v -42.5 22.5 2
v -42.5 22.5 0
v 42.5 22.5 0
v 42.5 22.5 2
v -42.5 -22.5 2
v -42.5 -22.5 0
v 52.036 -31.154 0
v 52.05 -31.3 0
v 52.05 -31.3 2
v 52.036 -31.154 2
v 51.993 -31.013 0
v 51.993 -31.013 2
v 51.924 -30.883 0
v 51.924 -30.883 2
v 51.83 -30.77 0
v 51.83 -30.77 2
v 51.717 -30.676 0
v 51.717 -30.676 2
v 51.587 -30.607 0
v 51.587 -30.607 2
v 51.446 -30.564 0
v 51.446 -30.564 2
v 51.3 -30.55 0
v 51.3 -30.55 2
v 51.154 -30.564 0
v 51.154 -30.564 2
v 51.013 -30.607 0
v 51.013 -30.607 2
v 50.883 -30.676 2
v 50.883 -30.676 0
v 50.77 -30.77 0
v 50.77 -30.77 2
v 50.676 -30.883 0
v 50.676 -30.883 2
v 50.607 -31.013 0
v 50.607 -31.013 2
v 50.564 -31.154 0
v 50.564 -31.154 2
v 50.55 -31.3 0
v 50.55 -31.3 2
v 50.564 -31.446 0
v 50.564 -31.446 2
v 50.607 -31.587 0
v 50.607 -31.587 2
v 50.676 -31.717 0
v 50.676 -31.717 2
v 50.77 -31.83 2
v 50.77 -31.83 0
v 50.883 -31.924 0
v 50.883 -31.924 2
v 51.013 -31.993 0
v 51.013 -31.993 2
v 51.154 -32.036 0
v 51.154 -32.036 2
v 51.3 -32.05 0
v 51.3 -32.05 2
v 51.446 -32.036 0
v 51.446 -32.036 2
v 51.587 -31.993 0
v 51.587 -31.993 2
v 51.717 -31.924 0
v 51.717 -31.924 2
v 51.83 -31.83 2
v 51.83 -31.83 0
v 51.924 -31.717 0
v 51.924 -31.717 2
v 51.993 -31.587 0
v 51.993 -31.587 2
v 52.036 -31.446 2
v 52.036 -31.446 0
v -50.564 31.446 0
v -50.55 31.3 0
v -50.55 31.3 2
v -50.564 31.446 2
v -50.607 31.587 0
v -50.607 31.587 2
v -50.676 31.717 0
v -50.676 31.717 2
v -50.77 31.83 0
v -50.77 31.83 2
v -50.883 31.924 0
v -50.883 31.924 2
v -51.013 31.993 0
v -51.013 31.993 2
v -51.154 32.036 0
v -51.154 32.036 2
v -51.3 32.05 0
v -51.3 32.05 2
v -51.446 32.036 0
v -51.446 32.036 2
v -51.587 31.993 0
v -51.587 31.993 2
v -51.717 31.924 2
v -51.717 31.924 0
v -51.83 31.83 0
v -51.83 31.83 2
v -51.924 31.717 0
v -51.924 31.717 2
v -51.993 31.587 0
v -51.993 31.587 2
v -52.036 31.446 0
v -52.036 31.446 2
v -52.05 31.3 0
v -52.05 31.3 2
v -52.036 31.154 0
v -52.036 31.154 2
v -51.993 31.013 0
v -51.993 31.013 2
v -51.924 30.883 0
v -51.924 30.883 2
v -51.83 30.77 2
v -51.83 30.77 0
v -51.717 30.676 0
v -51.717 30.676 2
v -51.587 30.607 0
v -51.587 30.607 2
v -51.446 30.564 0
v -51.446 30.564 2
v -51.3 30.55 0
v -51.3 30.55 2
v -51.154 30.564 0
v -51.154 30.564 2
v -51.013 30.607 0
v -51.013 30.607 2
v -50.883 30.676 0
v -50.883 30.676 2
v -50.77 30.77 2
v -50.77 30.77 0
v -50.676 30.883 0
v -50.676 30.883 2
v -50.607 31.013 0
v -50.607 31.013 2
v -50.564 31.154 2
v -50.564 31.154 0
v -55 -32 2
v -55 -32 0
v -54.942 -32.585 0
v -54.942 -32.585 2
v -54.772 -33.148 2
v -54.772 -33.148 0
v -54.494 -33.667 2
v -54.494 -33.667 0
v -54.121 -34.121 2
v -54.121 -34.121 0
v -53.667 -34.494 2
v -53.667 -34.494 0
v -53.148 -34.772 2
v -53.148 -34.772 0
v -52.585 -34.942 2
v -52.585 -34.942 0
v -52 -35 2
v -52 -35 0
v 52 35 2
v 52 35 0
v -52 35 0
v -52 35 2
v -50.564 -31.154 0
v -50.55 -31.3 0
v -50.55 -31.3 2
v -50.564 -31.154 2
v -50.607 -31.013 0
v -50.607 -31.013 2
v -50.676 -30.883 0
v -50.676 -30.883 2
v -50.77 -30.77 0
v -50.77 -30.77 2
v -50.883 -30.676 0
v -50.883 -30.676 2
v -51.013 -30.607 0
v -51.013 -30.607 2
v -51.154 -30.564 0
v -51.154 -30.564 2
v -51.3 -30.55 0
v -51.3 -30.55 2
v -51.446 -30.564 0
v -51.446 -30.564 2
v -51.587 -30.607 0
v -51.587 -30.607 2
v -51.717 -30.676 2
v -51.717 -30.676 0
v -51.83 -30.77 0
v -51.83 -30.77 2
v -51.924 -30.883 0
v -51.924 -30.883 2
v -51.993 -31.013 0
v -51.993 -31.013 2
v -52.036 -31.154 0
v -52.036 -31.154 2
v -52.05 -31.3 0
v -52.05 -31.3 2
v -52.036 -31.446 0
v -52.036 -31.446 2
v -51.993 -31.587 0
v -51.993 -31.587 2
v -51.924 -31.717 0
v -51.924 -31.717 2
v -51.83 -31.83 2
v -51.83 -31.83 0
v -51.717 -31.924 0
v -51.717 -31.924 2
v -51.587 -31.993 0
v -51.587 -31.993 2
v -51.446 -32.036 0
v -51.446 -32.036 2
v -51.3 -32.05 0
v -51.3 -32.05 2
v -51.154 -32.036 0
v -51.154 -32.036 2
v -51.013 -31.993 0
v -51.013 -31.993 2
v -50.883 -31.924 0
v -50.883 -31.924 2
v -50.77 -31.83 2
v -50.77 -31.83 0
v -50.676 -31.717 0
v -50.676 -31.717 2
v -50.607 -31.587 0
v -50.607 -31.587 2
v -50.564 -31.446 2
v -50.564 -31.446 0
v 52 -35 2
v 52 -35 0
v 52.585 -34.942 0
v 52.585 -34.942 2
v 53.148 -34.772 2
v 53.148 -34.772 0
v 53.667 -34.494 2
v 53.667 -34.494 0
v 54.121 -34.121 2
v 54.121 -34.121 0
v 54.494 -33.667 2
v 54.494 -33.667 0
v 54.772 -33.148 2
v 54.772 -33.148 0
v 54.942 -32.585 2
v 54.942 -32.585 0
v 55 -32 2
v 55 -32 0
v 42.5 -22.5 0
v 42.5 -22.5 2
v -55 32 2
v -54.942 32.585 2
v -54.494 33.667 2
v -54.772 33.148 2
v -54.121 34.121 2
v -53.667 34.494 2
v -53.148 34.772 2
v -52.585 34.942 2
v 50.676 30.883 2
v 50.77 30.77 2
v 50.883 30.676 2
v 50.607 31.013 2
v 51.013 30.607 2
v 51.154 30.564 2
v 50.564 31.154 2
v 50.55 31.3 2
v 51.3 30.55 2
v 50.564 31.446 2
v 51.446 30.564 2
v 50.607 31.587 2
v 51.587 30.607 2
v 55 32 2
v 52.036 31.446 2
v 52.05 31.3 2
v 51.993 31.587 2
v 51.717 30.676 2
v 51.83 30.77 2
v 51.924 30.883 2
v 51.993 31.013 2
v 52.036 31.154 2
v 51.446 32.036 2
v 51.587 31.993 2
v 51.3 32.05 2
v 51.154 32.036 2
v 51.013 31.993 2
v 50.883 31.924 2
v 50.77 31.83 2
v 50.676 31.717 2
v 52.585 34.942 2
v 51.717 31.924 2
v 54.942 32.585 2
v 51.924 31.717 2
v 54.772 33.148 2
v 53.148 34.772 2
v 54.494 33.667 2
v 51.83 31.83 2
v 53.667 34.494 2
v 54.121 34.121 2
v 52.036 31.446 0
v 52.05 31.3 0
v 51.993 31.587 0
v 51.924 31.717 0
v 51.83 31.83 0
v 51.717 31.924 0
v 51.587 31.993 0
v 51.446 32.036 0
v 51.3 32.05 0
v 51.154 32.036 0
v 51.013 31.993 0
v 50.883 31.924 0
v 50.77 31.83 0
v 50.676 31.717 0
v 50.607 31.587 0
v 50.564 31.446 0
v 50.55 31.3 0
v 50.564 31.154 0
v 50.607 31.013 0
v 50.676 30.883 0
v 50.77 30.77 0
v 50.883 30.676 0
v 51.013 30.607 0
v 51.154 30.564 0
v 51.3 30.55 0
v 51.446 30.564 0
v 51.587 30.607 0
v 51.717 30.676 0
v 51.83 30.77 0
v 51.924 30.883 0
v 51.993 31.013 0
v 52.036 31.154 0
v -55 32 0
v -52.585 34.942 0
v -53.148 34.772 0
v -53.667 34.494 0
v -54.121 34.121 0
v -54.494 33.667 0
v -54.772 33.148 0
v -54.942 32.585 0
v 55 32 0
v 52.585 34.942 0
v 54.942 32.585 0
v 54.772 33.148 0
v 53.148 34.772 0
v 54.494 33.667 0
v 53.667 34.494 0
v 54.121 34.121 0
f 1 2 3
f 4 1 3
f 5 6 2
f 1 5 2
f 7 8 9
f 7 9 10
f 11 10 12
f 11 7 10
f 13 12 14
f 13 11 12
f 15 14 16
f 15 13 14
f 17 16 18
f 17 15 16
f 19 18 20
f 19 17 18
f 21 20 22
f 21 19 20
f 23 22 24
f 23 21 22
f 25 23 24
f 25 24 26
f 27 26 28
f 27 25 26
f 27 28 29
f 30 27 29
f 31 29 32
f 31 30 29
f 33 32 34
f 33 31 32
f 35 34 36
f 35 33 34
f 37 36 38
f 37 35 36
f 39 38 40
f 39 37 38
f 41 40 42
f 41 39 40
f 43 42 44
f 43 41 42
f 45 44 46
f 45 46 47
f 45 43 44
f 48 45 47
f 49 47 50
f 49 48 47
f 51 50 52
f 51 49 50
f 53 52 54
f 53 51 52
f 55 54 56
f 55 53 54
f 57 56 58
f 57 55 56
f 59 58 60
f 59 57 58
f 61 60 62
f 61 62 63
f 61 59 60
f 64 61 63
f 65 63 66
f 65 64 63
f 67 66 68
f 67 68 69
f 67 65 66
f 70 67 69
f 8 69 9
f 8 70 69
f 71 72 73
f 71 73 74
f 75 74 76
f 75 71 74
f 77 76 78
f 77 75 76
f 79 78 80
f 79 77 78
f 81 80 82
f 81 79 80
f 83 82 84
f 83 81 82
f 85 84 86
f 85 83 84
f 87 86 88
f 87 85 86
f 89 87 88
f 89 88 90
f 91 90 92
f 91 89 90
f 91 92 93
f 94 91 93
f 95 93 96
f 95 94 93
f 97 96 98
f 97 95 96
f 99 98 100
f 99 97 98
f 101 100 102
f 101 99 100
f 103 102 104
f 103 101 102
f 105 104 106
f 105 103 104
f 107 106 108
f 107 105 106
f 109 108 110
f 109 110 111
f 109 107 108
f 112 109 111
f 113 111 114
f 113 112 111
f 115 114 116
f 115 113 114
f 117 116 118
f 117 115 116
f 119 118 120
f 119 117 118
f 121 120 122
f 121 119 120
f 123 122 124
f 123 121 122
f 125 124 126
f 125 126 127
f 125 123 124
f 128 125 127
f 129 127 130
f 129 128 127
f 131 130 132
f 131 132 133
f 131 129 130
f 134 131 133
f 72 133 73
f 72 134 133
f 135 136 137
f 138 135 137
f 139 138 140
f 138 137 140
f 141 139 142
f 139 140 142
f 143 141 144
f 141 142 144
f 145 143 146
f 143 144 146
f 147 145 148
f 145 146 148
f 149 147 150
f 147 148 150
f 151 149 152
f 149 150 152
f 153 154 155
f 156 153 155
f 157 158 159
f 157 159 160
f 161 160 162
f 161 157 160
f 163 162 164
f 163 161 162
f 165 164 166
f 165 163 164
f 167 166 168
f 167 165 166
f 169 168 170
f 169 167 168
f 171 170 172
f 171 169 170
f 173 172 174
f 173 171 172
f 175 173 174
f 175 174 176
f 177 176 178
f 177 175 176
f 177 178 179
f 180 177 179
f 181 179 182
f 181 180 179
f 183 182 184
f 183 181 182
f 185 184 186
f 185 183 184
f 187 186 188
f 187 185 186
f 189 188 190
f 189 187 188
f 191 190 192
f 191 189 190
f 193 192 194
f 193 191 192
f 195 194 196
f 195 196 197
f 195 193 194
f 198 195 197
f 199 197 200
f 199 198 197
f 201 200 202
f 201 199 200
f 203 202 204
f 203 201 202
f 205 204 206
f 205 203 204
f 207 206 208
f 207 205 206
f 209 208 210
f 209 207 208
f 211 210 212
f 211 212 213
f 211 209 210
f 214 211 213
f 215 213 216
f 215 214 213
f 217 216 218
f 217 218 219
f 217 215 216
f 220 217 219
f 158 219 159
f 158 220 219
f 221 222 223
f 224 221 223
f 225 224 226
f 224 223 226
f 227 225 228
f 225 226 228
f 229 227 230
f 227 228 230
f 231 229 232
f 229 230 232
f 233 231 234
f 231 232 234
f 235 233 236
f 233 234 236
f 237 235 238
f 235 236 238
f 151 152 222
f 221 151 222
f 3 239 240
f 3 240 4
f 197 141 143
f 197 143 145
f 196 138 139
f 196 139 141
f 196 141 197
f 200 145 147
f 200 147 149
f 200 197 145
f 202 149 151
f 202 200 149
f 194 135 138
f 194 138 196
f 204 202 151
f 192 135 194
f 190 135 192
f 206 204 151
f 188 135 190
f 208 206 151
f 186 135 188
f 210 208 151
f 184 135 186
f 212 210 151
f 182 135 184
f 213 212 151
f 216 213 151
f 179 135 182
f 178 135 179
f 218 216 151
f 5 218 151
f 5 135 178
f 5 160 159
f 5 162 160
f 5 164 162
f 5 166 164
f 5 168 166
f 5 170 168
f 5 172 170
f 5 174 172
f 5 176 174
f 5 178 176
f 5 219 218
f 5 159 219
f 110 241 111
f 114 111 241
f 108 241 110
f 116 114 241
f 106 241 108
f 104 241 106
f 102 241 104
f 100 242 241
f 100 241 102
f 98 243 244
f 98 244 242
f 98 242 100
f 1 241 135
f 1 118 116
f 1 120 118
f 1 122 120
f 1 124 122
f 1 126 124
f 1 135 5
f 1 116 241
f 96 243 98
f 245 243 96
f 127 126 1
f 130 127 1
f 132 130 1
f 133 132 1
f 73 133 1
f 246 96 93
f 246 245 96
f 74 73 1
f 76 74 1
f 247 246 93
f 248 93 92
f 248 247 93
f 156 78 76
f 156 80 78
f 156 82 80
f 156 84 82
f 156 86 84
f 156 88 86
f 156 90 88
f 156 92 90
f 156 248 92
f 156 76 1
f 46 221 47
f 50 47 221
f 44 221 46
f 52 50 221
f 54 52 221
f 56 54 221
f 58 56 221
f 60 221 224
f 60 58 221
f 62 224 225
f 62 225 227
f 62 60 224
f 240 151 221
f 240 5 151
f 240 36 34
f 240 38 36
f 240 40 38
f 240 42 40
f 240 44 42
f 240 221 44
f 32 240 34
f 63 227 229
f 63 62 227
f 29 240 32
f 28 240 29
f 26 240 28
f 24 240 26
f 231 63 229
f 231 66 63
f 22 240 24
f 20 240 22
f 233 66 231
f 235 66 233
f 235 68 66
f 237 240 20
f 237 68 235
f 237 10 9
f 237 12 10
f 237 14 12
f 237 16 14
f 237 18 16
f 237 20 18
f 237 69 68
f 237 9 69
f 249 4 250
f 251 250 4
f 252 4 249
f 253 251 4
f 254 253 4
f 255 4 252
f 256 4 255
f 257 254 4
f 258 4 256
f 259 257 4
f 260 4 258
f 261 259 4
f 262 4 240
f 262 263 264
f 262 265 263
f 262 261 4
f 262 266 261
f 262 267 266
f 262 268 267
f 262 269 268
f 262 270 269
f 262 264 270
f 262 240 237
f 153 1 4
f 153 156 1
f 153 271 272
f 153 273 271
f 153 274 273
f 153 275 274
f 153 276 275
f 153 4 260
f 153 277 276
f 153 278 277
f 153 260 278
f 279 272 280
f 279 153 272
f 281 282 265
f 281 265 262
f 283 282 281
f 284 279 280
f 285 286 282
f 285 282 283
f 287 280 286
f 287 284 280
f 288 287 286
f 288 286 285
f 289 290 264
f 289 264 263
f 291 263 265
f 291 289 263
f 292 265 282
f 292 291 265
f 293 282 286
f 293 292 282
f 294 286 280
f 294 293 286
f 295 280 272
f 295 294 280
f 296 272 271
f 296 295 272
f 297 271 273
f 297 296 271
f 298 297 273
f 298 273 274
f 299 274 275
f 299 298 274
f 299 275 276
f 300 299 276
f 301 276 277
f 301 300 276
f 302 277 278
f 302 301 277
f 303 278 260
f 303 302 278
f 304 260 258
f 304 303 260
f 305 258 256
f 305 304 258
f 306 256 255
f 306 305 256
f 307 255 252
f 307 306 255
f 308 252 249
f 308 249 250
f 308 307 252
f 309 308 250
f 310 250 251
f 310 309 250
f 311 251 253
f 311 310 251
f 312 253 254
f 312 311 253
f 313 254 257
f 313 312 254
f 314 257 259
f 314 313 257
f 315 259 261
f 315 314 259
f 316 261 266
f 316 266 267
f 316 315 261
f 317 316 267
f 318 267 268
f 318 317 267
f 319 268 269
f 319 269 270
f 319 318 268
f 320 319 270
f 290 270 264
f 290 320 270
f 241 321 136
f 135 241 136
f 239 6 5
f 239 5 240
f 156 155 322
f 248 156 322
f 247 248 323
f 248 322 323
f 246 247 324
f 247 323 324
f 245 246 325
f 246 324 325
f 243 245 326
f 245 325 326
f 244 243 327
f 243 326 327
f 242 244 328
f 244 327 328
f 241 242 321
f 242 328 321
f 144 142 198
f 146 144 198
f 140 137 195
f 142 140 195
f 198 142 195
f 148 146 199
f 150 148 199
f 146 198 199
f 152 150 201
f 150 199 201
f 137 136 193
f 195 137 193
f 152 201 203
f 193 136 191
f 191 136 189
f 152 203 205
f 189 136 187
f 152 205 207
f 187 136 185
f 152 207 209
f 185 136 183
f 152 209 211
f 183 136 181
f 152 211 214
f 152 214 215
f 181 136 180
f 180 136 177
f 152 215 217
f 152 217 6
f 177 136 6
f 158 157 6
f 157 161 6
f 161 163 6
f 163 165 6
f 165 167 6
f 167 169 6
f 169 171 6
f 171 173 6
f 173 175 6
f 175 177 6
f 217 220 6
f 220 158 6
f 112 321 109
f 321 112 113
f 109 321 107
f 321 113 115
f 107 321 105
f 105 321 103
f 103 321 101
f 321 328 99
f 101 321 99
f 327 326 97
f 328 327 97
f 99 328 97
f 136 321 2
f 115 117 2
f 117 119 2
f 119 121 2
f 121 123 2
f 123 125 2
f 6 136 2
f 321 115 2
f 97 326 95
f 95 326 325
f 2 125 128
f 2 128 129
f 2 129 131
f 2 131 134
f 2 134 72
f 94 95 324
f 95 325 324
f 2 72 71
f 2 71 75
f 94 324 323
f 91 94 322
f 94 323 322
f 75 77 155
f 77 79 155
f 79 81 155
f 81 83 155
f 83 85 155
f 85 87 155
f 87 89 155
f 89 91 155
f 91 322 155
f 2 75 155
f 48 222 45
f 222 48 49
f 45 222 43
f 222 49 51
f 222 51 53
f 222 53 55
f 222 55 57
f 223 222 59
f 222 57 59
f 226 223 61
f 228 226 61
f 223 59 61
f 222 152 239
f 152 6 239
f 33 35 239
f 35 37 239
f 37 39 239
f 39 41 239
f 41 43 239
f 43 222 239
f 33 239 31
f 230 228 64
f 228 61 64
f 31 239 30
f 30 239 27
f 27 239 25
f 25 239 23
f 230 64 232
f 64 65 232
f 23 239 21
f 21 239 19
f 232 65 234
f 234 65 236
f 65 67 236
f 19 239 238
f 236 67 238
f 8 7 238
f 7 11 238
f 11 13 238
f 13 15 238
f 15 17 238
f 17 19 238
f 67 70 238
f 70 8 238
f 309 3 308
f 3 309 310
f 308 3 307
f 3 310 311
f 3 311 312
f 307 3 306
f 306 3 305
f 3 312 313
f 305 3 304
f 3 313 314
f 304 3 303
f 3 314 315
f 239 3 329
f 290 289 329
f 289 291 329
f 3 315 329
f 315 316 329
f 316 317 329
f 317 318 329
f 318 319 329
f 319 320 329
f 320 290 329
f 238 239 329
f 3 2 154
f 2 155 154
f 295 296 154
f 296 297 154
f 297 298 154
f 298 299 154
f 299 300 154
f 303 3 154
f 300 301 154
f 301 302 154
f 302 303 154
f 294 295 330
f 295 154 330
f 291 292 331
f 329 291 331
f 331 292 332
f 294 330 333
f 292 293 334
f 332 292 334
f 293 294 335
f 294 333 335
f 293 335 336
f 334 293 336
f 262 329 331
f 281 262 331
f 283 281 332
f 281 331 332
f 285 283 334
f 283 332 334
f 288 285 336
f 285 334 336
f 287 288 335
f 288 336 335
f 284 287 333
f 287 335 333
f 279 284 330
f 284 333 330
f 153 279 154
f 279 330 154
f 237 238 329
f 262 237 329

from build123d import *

# Parameters (mm, degrees)
F0_R     = 0.75
F0_W     = 85
F0_H     = 45
F1_DEPTH = 2


with BuildPart() as f1:
    # F0 (on Top) → F1 (new body)
    with BuildSketch(Plane.XY):
        with BuildLine():
            ThreePointArc((55, 32), (54.12132, 34.12132), (52, 35))
            Line((52, 35), (-52, 35))
            ThreePointArc((-52, 35), (-54.12132, 34.12132), (-55, 32))
            Line((-55, 32), (-55, -32))
            ThreePointArc((-55, -32), (-54.12132, -34.12132), (-52, -35))
            Line((-52, -35), (52, -35))
            ThreePointArc((52, -35), (54.12132, -34.12132), (55, -32))
            Line((55, -32), (55, 32))
        make_face()
        with Locations((-51.3, -31.3)):
            Circle(F0_R, mode=Mode.SUBTRACT)
        with Locations((51.3, -31.3)):
            Circle(F0_R, mode=Mode.SUBTRACT)
        with Locations((-51.3, 31.3)):
            Circle(F0_R, mode=Mode.SUBTRACT)
        Rectangle(F0_W, F0_H, mode=Mode.SUBTRACT)
        with Locations((51.3, 31.3)):
            Circle(F0_R, mode=Mode.SUBTRACT)
    extrude(amount=F1_DEPTH)


solid = f1.part
